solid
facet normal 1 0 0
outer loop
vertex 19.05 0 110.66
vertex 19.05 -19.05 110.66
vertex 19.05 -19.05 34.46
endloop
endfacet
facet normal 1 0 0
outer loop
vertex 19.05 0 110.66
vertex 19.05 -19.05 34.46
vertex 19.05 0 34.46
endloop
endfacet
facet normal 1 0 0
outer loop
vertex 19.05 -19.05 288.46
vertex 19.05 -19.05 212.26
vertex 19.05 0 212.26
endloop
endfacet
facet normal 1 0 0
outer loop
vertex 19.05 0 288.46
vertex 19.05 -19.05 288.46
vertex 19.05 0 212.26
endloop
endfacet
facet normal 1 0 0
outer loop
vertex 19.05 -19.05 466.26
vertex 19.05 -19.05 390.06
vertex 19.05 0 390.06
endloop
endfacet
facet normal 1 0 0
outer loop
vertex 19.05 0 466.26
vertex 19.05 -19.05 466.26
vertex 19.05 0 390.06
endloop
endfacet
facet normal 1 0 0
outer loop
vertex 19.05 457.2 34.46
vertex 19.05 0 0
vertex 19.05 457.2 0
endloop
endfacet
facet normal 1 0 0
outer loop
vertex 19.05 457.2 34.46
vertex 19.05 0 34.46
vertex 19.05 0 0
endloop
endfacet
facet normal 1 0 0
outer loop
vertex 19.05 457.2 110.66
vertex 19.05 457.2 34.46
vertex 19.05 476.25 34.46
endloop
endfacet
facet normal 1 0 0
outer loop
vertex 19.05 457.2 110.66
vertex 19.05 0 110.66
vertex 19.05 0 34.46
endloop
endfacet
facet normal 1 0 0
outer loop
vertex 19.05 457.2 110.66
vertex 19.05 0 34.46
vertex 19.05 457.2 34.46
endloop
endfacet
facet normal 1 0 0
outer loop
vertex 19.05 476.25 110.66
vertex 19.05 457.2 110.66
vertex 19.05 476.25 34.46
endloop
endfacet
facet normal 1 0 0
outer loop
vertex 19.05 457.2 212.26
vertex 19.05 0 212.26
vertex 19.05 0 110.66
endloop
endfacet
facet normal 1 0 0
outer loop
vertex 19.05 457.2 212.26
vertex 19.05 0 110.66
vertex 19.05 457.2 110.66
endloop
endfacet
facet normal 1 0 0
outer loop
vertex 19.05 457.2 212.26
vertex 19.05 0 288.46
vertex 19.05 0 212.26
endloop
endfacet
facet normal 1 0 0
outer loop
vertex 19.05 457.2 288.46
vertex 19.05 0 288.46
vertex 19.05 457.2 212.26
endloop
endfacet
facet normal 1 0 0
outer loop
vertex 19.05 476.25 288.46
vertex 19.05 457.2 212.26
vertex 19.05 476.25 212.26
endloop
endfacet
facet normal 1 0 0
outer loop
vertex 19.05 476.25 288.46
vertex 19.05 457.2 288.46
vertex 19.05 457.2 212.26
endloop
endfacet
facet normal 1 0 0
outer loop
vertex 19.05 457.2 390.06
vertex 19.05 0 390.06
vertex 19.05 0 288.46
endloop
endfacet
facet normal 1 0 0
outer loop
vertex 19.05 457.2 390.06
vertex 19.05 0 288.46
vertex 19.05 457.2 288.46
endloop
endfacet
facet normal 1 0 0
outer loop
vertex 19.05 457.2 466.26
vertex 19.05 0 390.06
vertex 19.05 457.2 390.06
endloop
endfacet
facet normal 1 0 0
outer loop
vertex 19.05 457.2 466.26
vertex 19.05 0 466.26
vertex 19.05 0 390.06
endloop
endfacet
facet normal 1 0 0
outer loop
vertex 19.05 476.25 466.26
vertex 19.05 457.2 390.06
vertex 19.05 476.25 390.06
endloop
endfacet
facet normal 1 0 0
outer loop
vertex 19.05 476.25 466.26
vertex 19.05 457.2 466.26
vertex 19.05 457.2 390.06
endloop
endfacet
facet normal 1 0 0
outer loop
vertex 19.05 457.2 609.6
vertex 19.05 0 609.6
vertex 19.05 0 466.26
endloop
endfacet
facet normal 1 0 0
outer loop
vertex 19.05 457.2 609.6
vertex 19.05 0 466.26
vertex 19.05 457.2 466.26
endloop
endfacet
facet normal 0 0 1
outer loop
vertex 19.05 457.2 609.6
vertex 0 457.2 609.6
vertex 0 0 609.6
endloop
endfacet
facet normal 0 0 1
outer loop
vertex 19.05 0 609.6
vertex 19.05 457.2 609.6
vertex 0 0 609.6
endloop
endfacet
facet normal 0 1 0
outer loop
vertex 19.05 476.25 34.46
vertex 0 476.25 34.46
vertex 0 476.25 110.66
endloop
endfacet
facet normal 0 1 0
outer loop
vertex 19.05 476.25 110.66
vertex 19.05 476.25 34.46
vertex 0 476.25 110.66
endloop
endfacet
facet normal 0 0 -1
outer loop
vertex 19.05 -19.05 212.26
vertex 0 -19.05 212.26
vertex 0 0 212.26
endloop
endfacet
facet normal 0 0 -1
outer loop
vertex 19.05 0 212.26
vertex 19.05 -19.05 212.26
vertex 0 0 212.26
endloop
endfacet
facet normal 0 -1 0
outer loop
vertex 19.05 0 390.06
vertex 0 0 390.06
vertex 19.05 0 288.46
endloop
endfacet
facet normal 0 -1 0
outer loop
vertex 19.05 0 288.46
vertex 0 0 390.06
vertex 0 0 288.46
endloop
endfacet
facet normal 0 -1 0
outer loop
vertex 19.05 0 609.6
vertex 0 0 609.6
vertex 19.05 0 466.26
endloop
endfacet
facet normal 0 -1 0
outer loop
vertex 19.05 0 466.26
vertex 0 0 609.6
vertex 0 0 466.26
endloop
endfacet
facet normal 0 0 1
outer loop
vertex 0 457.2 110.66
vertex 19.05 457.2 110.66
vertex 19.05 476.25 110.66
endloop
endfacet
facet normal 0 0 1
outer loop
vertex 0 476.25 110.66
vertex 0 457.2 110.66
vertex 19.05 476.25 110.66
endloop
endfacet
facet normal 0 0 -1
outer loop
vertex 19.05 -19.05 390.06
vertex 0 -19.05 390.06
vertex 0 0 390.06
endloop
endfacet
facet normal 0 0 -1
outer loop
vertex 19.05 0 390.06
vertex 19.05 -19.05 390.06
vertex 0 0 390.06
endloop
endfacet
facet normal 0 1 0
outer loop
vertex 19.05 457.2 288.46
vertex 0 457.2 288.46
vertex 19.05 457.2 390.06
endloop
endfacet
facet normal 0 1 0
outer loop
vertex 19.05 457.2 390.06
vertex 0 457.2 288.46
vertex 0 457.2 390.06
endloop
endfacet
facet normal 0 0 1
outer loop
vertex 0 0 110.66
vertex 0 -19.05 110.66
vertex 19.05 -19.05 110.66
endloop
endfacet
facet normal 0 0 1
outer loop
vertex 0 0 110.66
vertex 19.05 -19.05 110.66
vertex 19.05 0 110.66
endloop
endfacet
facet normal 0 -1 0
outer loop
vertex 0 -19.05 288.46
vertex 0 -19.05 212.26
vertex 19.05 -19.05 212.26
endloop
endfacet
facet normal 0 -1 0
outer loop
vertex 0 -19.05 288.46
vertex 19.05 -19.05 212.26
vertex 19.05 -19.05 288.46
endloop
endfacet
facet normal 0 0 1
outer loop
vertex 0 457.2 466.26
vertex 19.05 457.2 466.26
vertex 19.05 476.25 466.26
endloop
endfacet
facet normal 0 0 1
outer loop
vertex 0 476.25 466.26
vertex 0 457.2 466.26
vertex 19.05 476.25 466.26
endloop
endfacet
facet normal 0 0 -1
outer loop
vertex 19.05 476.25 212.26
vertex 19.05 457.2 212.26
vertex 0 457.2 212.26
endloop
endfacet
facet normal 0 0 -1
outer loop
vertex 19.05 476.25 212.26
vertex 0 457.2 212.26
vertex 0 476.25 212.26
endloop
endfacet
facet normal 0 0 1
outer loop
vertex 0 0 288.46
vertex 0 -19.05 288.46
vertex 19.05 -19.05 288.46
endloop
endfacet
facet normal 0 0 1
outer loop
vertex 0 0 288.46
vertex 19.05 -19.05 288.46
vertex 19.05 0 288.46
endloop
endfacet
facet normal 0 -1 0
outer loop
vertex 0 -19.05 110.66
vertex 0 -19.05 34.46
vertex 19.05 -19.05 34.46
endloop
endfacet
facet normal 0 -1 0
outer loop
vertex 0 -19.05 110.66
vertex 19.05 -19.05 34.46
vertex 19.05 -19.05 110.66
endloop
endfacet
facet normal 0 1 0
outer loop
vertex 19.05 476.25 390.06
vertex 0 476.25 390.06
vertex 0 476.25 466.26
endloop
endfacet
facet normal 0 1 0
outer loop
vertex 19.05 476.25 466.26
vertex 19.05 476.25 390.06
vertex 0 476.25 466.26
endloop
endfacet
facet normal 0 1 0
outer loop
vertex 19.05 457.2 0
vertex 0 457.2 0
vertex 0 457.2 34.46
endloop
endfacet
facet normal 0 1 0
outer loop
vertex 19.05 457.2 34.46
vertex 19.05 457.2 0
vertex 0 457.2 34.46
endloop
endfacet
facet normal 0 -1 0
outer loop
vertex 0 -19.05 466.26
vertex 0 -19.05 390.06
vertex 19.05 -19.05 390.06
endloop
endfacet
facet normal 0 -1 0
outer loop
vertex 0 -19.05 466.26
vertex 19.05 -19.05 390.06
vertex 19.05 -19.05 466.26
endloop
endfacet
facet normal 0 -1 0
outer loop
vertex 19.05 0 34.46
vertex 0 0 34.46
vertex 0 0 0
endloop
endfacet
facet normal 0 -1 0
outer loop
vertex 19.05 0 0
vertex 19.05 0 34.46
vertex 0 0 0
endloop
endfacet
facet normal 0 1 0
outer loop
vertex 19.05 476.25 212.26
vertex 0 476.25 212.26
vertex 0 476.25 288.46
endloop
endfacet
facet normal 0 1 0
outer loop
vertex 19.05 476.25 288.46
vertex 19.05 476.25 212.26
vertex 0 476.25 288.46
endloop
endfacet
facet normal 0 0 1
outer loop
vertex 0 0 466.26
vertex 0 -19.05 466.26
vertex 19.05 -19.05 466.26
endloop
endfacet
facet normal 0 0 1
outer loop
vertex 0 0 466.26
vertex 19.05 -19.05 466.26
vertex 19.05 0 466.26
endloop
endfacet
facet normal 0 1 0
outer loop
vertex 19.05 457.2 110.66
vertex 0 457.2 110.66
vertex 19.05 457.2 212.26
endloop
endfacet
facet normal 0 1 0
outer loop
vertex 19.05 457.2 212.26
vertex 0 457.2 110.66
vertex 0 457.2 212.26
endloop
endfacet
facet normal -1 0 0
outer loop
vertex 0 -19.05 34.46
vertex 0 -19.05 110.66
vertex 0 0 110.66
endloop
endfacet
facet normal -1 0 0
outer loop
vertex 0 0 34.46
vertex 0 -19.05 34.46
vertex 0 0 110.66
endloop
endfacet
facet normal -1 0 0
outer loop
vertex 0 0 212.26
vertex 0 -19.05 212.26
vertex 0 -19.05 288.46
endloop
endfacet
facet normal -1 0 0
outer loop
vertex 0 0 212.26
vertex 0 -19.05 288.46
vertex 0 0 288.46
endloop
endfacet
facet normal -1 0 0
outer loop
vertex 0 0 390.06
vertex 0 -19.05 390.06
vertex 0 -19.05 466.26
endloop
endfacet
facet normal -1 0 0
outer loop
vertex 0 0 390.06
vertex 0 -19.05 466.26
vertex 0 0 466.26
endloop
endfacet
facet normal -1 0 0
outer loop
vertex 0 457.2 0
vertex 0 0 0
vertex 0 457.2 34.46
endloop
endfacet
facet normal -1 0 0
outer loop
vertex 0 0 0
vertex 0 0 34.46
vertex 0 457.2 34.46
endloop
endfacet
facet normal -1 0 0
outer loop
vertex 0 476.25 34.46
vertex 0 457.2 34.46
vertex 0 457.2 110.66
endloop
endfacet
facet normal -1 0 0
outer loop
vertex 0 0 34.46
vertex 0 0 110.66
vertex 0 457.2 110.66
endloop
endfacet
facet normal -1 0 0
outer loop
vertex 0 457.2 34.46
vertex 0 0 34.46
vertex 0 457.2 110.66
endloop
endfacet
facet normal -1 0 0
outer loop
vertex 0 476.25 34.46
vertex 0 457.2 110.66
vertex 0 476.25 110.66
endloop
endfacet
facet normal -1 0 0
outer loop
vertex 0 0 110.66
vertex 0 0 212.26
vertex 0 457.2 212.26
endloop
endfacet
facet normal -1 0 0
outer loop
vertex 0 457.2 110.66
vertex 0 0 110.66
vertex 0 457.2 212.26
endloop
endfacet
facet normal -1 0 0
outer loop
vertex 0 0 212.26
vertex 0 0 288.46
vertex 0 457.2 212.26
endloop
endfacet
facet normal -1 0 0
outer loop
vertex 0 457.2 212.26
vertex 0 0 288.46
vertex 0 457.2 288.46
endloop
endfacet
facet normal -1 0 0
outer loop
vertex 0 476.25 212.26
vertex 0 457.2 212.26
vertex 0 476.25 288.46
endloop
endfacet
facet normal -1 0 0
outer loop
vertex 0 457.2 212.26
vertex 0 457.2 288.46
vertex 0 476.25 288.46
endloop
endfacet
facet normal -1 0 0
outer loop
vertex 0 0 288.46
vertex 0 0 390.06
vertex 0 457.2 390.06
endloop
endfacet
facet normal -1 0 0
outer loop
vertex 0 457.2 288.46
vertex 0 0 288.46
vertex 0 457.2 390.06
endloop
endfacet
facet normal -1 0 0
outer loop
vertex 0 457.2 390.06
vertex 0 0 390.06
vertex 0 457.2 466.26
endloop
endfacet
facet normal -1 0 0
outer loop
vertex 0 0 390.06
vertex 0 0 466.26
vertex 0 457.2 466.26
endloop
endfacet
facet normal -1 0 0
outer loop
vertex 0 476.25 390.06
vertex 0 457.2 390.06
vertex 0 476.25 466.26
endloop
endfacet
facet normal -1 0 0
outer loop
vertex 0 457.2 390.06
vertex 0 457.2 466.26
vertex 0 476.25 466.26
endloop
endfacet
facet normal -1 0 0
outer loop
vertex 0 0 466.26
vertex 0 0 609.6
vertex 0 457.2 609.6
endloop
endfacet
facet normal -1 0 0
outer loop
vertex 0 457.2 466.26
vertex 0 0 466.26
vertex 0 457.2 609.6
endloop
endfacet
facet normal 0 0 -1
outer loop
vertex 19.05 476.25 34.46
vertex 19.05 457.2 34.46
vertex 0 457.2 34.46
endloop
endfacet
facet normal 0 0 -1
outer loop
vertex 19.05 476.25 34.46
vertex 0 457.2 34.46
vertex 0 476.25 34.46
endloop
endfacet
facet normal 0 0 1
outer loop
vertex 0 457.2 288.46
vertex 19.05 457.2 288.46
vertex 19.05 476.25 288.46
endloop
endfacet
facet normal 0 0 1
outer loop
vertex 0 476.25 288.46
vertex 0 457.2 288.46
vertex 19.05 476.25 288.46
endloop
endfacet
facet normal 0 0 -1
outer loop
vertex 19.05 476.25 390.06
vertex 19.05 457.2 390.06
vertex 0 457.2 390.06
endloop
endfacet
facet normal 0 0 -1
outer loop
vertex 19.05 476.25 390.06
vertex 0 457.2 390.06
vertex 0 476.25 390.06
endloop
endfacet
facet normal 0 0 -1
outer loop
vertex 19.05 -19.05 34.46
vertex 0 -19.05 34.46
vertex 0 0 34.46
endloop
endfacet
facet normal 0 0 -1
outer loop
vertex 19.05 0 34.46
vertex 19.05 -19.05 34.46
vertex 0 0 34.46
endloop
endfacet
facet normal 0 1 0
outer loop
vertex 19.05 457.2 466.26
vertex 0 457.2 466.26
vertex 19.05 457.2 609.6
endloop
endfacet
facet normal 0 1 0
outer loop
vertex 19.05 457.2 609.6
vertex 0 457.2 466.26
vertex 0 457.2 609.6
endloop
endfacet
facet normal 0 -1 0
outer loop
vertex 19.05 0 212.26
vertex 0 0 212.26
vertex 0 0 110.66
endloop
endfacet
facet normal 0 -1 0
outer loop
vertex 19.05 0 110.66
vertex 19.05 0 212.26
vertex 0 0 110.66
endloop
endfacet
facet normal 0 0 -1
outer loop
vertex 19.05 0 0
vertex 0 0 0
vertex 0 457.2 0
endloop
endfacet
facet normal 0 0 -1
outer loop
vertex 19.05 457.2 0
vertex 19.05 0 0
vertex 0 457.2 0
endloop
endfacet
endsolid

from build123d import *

# Parameters (mm, degrees)
F0_W     = 19.05
F0_H     = 76.2
F1_DEPTH = 19.05


with BuildPart() as f1:
    # F0 (on Right) → F1 (new body)
    with BuildSketch(Plane.YZ):
        Polygon((0, 34.459569), (0, 0), (457.2, 0), (457.2, 34.459569), (457.2, 110.659569), (457.2, 212.259569), (457.2, 288.459569), (457.2, 390.059569), (457.2, 466.259569), (457.2, 609.6), (0, 609.6), (0, 466.259569), (0, 390.059569), (0, 288.459569), (0, 212.259569), (0, 110.659569), align=None)
        with Locations((-9.525, 72.559569)):
            Rectangle(F0_W, F0_H)
        with Locations((466.725, 72.559569)):
            Rectangle(F0_W, F0_H)
        with Locations((-9.525, 250.359569)):
            Rectangle(F0_W, F0_H)
        with Locations((466.725, 250.359569)):
            Rectangle(F0_W, F0_H)
        with Locations((-9.525, 428.159569)):
            Rectangle(F0_W, F0_H)
        with Locations((466.725, 428.159569)):
            Rectangle(F0_W, F0_H)
    extrude(amount=F1_DEPTH)


solid = f1.part
